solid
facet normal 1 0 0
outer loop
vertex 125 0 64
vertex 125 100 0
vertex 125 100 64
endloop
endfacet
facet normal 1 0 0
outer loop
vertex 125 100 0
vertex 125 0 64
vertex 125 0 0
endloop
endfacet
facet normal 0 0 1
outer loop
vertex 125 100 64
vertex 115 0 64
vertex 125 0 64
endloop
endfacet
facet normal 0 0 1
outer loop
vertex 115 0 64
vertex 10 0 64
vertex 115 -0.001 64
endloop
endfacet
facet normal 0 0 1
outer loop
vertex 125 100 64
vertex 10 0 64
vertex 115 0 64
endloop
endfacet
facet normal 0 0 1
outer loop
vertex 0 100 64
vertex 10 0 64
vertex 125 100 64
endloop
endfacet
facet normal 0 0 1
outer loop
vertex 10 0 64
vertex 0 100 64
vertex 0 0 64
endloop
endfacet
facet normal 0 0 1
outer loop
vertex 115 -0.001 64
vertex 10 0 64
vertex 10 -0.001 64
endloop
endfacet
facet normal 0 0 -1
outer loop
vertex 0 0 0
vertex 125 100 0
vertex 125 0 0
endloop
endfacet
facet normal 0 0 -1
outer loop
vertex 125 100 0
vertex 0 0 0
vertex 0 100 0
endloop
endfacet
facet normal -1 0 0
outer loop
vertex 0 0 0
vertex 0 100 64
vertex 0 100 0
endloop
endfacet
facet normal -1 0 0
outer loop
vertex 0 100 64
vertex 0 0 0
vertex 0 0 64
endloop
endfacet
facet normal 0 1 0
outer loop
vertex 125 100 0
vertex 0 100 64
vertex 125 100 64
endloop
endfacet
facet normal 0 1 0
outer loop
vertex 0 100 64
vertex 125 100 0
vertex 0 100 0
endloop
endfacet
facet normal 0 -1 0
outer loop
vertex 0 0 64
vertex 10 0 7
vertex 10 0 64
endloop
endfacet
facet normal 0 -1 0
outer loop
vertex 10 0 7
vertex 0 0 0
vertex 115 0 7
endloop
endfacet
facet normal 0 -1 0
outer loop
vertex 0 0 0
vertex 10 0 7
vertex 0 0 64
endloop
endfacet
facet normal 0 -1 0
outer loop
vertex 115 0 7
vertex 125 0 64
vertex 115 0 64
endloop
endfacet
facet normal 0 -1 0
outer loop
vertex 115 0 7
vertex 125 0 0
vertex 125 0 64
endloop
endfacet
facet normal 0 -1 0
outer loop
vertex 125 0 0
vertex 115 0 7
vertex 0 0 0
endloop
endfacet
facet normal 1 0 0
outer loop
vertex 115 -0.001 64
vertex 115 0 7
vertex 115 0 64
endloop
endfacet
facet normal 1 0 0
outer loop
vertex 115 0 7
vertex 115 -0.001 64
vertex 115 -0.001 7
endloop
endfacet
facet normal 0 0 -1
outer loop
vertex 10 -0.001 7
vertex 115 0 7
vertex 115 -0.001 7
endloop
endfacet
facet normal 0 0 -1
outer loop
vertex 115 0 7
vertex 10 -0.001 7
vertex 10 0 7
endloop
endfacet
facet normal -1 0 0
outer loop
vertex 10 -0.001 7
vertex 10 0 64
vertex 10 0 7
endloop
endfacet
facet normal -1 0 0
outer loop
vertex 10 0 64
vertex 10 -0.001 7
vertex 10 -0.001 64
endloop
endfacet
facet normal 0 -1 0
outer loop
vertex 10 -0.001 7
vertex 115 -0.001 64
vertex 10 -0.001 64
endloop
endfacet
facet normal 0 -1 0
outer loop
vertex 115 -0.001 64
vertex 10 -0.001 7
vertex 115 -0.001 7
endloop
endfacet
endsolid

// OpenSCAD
module sfxPowerSupply() {

    length = 125.0;
    width = 100.0;
    height = 64;
    screwD = 3.5;
    
    eps = 0.001;
    
    // body
    color([0,1,0]) cube(size=[length, width, height]);
    
    // main fan
    translate([62.5, 50,0])
    color([0,1,1])
    circle(d=88);
    
    
    // open faces
    translate([10,-eps, 7])
    color([0,1,1])
    cube(size=[length-20, eps, height-7]);

    
    // screw holes
    color([1,0,1])
    translate([length-6, eps, height-6])
    rotate(a=[90,0,0])
    circle(d=screwD);
    
    color([1,0,1])
    translate([6, eps, height-6])
    rotate(a=[90,0,0])
    circle(d=screwD);
    
    color([1,0,1])
    translate([6, eps, 6])
    rotate(a=[90,0,0])
    circle(d=screwD);
    
    color([1,0,1])
    translate([length-6, eps, 6])
    rotate(a=[90,0,0])
    circle(d=screwD);
        
    color([1,0,1])
    translate([6, eps, height-(6+25.5)])
    rotate(a=[90,0,0])
    circle(d=screwD);
    
    color([1,0,1])
    translate([length-6, eps, height-(6+25.5)])
    rotate(a=[90,0,0])
    circle(d=screwD);

    
}

sfxPowerSupply();
